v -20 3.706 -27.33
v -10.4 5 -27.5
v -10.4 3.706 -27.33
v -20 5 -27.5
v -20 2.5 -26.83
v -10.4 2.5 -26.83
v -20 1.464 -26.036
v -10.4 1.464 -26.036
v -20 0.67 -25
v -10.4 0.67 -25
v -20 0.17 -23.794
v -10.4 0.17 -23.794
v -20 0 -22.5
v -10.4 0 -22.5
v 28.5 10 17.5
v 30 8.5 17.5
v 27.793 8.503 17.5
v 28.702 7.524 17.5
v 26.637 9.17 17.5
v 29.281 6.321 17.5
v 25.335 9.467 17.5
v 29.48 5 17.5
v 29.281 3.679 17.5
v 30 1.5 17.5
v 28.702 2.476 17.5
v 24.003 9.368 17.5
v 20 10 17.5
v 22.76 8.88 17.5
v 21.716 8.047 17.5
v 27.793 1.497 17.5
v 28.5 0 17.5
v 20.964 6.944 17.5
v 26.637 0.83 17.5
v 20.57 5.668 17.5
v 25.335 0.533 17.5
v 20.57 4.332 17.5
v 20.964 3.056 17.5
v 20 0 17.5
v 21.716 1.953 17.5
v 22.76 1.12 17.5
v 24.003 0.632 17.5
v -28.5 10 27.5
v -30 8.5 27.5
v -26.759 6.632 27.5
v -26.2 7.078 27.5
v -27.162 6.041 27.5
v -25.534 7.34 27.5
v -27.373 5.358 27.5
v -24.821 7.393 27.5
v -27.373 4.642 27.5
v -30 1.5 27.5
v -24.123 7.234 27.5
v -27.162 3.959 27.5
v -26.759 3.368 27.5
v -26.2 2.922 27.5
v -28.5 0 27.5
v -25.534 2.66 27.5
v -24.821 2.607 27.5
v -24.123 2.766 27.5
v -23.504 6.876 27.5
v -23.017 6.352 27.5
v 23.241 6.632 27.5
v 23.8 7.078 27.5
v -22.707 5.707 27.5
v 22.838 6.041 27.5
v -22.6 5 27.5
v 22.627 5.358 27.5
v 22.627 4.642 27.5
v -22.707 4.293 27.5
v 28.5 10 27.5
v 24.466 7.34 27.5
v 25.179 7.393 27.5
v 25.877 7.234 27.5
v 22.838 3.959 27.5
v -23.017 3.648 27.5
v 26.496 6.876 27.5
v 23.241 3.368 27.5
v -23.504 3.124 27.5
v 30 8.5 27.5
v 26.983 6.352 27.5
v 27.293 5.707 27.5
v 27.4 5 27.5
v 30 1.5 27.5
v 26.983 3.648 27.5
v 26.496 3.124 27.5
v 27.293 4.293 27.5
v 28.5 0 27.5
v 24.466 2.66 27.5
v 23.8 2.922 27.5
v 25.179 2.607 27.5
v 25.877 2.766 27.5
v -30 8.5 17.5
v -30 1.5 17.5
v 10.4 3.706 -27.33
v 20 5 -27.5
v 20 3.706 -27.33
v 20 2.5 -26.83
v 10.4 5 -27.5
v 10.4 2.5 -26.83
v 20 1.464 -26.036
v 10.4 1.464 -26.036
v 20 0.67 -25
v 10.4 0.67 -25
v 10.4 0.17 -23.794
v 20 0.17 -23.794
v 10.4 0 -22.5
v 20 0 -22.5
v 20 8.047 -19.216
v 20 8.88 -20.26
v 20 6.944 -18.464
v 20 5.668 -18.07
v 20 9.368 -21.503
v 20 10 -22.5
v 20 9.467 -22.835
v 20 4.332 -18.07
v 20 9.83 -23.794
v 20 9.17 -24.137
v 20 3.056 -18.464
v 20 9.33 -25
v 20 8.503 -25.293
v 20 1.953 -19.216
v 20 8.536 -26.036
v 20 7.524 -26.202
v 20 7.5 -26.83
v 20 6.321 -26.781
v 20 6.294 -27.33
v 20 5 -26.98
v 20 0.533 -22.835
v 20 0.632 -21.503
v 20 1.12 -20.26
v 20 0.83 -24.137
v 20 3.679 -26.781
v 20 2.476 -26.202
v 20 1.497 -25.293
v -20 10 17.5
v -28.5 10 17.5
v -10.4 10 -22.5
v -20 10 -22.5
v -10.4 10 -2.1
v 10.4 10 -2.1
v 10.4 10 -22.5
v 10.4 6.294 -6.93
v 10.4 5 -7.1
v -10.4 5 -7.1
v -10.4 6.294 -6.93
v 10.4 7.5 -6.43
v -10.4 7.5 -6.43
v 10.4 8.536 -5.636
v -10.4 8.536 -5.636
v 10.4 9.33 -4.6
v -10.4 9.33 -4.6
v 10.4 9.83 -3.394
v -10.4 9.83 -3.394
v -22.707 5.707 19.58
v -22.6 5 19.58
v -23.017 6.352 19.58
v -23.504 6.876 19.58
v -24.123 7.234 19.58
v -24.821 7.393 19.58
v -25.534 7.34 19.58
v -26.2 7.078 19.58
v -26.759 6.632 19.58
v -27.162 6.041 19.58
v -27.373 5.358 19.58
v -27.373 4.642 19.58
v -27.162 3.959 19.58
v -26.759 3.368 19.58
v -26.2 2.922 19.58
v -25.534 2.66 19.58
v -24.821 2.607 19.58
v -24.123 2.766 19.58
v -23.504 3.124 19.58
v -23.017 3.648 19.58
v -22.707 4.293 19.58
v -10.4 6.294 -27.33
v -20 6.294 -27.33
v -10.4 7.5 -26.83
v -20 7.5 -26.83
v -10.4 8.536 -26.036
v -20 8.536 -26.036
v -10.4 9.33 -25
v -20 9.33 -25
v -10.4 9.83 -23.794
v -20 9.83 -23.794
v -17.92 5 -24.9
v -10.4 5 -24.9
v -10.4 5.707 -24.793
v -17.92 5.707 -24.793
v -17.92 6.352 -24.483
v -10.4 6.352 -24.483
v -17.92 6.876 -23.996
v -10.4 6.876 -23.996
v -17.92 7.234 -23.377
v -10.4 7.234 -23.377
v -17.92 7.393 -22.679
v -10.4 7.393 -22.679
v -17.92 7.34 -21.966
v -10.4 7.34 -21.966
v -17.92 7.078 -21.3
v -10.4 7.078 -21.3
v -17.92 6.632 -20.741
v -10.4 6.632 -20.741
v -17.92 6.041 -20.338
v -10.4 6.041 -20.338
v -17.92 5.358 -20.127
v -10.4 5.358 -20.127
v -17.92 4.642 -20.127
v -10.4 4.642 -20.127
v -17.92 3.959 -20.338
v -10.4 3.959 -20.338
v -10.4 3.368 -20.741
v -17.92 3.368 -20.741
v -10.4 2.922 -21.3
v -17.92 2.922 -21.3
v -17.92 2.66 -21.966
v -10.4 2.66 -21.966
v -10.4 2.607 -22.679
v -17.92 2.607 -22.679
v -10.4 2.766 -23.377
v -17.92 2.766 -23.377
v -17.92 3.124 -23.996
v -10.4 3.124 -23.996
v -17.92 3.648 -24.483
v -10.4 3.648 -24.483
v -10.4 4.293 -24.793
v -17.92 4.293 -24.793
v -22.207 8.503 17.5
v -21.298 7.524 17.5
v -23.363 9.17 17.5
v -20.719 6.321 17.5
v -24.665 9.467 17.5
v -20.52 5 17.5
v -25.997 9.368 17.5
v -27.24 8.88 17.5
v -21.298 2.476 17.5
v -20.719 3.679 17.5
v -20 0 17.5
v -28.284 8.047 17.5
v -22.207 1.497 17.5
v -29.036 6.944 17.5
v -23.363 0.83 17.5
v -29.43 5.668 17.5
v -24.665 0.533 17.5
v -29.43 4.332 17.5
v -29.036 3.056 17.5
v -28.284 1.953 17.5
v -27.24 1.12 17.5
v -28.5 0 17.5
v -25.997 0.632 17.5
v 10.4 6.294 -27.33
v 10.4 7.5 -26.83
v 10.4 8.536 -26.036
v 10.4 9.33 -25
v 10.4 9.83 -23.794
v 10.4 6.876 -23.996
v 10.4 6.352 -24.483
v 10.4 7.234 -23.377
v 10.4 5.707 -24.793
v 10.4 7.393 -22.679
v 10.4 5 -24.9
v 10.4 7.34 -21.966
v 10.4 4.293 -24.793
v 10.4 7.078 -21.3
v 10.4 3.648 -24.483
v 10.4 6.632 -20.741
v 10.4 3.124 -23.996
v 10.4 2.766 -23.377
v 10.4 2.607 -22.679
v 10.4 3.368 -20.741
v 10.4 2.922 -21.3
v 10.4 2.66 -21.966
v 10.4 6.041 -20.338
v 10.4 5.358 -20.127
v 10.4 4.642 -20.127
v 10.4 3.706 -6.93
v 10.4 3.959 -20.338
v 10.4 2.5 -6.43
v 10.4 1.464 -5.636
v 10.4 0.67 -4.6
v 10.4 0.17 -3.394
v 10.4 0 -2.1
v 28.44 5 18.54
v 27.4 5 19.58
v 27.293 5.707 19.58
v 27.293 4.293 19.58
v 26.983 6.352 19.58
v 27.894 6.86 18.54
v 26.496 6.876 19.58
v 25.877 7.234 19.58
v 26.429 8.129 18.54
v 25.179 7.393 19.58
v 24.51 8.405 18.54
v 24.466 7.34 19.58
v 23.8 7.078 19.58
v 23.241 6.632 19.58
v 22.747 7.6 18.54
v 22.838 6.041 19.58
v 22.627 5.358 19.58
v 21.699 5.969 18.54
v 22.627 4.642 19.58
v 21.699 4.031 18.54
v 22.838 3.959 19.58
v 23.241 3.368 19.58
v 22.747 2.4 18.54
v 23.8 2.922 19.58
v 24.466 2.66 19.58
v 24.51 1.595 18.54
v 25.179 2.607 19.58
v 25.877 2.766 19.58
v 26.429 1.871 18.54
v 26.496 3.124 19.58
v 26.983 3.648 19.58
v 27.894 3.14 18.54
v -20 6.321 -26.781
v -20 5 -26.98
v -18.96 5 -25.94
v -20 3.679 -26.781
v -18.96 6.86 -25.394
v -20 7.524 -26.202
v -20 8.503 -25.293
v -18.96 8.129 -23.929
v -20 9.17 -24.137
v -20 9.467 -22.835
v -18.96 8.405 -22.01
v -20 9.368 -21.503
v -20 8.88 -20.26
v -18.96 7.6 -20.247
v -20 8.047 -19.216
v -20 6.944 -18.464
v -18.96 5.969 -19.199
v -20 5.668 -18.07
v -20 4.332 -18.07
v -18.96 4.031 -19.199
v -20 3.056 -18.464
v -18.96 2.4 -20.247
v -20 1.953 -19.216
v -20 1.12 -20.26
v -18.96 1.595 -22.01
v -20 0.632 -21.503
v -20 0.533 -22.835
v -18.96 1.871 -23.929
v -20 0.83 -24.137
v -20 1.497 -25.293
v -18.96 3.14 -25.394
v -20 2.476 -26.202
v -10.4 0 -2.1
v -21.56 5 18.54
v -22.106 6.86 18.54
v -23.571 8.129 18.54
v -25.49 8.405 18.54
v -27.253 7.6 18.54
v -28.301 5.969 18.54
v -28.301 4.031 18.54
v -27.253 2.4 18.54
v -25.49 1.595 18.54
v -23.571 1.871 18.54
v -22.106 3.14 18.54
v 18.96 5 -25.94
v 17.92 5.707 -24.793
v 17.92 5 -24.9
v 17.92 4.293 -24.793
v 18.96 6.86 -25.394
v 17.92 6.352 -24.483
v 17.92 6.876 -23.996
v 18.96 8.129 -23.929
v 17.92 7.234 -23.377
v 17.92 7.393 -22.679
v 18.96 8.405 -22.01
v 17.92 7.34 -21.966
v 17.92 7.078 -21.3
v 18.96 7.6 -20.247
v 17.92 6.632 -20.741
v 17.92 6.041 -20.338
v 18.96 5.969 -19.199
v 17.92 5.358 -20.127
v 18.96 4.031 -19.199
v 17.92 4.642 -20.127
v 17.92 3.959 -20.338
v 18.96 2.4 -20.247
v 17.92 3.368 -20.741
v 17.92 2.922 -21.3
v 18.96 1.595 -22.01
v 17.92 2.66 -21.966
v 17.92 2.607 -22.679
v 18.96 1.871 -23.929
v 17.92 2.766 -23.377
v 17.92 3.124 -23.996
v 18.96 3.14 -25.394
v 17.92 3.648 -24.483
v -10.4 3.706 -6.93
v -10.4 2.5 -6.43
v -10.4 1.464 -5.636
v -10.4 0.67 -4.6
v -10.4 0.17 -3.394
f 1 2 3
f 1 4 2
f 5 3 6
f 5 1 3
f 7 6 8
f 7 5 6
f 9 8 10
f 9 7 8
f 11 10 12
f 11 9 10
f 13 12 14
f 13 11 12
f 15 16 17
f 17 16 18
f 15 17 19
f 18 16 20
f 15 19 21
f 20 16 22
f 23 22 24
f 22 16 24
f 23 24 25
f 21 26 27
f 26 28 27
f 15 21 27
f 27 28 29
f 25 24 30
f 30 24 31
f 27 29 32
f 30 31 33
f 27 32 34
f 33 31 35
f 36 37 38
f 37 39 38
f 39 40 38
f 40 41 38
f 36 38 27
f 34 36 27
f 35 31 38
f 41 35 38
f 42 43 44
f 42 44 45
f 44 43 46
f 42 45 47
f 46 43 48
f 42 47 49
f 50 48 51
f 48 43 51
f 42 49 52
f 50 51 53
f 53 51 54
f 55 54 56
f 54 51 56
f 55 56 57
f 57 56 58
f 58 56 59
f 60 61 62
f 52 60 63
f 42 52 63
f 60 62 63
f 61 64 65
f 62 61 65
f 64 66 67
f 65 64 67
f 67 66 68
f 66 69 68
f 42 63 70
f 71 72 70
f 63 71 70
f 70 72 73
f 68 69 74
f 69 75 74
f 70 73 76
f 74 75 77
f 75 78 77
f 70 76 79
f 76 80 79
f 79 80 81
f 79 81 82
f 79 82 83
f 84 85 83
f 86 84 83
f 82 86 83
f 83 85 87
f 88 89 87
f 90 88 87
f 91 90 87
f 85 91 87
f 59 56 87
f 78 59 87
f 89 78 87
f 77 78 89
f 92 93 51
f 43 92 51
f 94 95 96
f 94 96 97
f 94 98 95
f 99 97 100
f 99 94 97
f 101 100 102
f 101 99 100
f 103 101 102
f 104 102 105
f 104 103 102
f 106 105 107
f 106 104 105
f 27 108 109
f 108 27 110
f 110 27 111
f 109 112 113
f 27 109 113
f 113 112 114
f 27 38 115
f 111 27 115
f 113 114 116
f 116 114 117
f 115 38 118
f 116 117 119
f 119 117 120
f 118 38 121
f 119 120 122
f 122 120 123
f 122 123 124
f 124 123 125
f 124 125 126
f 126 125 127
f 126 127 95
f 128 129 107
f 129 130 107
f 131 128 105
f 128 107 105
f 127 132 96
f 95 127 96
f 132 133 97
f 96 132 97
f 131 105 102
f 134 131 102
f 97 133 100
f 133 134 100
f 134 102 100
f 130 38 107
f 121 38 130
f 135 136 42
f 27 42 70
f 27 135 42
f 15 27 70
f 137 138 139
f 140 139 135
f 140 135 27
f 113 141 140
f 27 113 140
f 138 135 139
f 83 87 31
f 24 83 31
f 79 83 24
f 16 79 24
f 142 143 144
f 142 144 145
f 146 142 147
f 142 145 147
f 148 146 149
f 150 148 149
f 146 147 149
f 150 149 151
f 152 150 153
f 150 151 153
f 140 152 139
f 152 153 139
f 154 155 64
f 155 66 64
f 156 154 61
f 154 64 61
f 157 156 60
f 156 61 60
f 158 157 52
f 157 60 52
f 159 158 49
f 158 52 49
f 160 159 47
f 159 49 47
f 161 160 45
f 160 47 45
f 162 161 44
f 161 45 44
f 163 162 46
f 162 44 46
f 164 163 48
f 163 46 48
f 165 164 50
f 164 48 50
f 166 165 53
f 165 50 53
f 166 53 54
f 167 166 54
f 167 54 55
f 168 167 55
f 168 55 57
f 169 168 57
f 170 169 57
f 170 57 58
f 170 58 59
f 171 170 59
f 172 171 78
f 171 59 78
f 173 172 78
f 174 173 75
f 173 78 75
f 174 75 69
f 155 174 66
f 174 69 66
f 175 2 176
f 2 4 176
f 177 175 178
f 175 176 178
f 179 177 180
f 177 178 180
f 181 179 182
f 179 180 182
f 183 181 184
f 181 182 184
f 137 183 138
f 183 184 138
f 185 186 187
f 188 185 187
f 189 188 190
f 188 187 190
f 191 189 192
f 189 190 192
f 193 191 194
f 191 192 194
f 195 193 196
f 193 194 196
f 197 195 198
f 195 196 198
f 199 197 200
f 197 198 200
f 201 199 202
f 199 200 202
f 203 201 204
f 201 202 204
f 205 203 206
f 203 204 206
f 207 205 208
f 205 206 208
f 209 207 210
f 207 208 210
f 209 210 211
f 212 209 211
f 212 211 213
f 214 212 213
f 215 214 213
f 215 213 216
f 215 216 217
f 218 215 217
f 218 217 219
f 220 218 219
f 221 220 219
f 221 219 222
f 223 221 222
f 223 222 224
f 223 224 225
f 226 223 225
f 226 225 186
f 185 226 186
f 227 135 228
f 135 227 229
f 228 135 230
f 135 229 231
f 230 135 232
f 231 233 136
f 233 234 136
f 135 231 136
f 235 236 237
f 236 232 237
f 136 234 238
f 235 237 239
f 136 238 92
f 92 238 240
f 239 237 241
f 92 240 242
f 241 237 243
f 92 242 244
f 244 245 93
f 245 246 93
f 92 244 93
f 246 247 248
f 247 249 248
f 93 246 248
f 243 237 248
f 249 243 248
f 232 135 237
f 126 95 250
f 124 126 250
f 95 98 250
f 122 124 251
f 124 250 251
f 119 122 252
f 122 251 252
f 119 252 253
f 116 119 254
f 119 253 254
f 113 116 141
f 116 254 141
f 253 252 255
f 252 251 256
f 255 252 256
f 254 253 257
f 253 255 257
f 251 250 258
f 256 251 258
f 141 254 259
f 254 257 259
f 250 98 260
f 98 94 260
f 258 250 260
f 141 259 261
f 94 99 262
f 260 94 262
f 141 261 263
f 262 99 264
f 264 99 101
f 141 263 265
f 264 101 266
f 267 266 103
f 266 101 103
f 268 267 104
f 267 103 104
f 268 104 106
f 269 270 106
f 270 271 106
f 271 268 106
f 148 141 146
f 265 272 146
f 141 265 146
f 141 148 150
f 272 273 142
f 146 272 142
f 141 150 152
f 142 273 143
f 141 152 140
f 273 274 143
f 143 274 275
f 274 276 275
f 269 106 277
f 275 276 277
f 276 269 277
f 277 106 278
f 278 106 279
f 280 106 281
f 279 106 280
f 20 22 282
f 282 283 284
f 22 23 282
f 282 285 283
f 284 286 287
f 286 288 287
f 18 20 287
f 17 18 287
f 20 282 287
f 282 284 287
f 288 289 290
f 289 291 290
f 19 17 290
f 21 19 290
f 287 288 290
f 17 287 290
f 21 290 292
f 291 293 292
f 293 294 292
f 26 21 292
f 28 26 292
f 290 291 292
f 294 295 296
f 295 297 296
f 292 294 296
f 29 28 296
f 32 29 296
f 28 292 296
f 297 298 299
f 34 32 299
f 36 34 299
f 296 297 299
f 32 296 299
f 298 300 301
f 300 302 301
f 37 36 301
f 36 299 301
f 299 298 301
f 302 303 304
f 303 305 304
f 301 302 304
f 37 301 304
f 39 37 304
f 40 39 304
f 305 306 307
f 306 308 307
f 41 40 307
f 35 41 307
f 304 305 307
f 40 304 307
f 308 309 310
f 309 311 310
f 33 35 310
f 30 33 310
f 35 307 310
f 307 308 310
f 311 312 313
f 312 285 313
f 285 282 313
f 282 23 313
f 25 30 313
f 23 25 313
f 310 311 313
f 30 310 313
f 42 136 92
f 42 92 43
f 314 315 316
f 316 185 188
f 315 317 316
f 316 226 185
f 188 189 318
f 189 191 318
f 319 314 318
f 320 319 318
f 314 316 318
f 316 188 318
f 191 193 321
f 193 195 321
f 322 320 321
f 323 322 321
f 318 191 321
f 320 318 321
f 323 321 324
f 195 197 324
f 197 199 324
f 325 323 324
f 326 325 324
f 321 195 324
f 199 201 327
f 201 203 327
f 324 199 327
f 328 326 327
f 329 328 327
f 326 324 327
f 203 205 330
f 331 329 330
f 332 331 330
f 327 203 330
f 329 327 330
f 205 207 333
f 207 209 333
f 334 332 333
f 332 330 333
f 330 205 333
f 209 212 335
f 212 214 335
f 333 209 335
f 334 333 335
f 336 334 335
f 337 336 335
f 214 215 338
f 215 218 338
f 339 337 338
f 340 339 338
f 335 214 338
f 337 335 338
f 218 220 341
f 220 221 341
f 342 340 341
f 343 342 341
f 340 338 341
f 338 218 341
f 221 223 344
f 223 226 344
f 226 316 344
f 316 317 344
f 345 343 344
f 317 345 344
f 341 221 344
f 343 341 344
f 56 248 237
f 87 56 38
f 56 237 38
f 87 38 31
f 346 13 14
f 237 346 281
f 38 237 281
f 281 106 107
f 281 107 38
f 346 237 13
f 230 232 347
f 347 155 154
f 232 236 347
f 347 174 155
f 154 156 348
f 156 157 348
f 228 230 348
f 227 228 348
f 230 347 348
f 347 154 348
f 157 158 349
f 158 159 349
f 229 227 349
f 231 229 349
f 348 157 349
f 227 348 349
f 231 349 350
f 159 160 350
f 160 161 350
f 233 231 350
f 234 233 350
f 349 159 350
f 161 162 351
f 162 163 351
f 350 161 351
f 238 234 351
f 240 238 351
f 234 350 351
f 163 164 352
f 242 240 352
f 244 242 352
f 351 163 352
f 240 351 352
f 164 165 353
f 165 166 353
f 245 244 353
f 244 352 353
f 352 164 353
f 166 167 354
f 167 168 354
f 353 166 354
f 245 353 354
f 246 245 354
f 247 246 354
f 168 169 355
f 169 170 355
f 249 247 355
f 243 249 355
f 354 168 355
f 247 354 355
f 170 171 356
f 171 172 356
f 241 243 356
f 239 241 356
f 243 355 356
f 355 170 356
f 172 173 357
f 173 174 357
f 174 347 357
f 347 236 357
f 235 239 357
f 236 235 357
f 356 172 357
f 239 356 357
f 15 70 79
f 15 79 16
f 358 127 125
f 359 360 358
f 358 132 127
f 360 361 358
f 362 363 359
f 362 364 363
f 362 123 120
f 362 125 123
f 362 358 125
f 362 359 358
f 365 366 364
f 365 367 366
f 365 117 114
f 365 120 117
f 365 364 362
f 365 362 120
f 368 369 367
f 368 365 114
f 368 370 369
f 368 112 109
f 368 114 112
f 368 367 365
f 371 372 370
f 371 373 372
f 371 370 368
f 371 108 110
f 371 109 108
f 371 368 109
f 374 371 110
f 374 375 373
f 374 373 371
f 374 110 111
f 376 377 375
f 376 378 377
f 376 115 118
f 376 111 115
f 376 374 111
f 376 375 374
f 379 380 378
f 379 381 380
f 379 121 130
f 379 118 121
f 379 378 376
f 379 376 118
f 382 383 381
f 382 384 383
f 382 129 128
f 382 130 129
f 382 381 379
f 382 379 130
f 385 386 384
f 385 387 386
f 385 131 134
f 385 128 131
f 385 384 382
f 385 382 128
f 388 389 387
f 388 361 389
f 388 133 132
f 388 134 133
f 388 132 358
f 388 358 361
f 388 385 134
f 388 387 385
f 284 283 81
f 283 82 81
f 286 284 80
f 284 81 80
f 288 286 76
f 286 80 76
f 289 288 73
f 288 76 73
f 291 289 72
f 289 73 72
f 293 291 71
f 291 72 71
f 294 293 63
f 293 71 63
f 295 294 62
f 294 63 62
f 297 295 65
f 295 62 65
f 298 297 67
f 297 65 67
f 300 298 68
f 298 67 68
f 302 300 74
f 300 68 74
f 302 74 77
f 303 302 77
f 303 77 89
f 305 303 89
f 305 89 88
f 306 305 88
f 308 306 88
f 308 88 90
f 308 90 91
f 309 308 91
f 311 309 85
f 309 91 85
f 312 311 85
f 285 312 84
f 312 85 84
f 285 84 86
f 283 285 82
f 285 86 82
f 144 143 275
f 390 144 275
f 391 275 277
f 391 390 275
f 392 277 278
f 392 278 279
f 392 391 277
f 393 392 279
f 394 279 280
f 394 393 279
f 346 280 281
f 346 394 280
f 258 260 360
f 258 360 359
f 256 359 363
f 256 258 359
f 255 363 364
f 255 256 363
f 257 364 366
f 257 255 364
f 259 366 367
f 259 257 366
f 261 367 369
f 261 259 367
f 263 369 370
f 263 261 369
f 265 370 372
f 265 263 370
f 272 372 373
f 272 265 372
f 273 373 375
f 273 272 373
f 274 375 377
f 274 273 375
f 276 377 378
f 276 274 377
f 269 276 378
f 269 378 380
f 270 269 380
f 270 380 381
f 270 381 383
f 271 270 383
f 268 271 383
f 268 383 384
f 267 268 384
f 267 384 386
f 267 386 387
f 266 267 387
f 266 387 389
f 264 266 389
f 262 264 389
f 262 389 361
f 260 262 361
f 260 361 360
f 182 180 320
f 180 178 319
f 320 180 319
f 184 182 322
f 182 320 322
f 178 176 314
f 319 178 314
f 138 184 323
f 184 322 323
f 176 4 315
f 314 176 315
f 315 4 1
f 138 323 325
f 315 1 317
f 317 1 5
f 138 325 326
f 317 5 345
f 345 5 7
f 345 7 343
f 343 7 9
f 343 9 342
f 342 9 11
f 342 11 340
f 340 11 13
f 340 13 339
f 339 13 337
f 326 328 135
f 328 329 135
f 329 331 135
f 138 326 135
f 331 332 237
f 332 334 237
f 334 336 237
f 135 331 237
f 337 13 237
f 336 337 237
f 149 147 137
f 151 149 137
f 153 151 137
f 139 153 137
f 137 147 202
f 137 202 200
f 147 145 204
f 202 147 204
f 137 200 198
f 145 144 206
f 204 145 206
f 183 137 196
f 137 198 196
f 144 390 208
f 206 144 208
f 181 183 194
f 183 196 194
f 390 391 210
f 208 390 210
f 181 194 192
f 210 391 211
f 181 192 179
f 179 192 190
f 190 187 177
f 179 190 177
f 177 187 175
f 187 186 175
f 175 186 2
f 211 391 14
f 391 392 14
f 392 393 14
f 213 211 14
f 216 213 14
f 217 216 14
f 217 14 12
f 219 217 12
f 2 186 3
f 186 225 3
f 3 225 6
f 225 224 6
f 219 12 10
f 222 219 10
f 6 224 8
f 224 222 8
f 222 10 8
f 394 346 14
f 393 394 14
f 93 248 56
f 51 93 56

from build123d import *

# Parameters (mm, degrees)
BOSS_EXTRUDE1_DEPTH           = 10
FILLET1_R                     = 5
CHAMFER1_SIZE                 = 1.5
CSK_FOR_M4_SFHCS1_D           = 4.8
CSK_FOR_M4_SFHCS1_CSINK_D     = 8.96
CSK_FOR_M4_SFHCS1_CSINK_ANGLE = 90
CSK_FOR_M4_SFHCS2_D           = 4.8
CSK_FOR_M4_SFHCS2_DEPTH       = 9.6
CSK_FOR_M4_SFHCS2_CSINK_D     = 8.96
CSK_FOR_M4_SFHCS2_CSINK_ANGLE = 90


with BuildPart() as part:
    # Sketch1 → Boss-Extrude1 (new body)
    with BuildSketch(Plane(origin=(0, 0, 0), x_dir=(1, 0, 0), z_dir=(0, 1, 0))):
        Polygon((-30, -17.5), (-30, -27.5), (30, -27.5), (30, -17.5), (20, -17.5), (20, 27.5), (10.4, 27.5), (10.4, 7.1), (-10.4, 7.1), (-10.4, 27.5), (-20, 27.5), (-20, -17.5), align=None)
    extrude(amount=BOSS_EXTRUDE1_DEPTH)

    # Fillet1
    fillet1_edges = [part.edges().sort_by_distance(p)[0] for p in [
        (-15.2, 0, -27.5),
        (15.2, 0, -27.5),
        (-15.2, 10, -27.5),
        (15.2, 10, -27.5),
        (0, 10, -7.1),
        (0, 0, -7.1),
    ]]
    fillet(fillet1_edges, radius=FILLET1_R - 0.0001)  # a hair under: the kernel refuses the full size

    # Chamfer1
    chamfer1_edges = [part.edges().sort_by_distance(p)[0] for p in [
        (30, 0, 22.5),
        (-30, 0, 22.5),
        (-30, 10, 22.5),
        (30, 10, 22.5),
    ]]
    chamfer(chamfer1_edges, length=CHAMFER1_SIZE)

    # CSK for M4 SFHCS1 (through all)
    with Locations(Plane(origin=(0, 0, 17.5), x_dir=(-1, 0, 0), z_dir=(0, 0, -1))):
        with Locations((-25, 5), (25, 5)):
            CounterSinkHole(CSK_FOR_M4_SFHCS1_D / 2, CSK_FOR_M4_SFHCS1_CSINK_D / 2, counter_sink_angle=CSK_FOR_M4_SFHCS1_CSINK_ANGLE)

    # CSK for M4 SFHCS2
    with Locations(Plane.ZY.offset(20)):
        with Locations((-22.5, 5)):
            csk_for_m4_sfhcs2 = CounterSinkHole(CSK_FOR_M4_SFHCS2_D / 2, CSK_FOR_M4_SFHCS2_CSINK_D / 2, depth=CSK_FOR_M4_SFHCS2_DEPTH, counter_sink_angle=CSK_FOR_M4_SFHCS2_CSINK_ANGLE)

    # Mirror1: CSK for M4 SFHCS2 across plane
    add(csk_for_m4_sfhcs2.mirror(Plane(origin=(0, 0, 0), x_dir=(0, 0, 1), z_dir=(1, 0, 0))), mode=Mode.SUBTRACT)


solid = part.part
